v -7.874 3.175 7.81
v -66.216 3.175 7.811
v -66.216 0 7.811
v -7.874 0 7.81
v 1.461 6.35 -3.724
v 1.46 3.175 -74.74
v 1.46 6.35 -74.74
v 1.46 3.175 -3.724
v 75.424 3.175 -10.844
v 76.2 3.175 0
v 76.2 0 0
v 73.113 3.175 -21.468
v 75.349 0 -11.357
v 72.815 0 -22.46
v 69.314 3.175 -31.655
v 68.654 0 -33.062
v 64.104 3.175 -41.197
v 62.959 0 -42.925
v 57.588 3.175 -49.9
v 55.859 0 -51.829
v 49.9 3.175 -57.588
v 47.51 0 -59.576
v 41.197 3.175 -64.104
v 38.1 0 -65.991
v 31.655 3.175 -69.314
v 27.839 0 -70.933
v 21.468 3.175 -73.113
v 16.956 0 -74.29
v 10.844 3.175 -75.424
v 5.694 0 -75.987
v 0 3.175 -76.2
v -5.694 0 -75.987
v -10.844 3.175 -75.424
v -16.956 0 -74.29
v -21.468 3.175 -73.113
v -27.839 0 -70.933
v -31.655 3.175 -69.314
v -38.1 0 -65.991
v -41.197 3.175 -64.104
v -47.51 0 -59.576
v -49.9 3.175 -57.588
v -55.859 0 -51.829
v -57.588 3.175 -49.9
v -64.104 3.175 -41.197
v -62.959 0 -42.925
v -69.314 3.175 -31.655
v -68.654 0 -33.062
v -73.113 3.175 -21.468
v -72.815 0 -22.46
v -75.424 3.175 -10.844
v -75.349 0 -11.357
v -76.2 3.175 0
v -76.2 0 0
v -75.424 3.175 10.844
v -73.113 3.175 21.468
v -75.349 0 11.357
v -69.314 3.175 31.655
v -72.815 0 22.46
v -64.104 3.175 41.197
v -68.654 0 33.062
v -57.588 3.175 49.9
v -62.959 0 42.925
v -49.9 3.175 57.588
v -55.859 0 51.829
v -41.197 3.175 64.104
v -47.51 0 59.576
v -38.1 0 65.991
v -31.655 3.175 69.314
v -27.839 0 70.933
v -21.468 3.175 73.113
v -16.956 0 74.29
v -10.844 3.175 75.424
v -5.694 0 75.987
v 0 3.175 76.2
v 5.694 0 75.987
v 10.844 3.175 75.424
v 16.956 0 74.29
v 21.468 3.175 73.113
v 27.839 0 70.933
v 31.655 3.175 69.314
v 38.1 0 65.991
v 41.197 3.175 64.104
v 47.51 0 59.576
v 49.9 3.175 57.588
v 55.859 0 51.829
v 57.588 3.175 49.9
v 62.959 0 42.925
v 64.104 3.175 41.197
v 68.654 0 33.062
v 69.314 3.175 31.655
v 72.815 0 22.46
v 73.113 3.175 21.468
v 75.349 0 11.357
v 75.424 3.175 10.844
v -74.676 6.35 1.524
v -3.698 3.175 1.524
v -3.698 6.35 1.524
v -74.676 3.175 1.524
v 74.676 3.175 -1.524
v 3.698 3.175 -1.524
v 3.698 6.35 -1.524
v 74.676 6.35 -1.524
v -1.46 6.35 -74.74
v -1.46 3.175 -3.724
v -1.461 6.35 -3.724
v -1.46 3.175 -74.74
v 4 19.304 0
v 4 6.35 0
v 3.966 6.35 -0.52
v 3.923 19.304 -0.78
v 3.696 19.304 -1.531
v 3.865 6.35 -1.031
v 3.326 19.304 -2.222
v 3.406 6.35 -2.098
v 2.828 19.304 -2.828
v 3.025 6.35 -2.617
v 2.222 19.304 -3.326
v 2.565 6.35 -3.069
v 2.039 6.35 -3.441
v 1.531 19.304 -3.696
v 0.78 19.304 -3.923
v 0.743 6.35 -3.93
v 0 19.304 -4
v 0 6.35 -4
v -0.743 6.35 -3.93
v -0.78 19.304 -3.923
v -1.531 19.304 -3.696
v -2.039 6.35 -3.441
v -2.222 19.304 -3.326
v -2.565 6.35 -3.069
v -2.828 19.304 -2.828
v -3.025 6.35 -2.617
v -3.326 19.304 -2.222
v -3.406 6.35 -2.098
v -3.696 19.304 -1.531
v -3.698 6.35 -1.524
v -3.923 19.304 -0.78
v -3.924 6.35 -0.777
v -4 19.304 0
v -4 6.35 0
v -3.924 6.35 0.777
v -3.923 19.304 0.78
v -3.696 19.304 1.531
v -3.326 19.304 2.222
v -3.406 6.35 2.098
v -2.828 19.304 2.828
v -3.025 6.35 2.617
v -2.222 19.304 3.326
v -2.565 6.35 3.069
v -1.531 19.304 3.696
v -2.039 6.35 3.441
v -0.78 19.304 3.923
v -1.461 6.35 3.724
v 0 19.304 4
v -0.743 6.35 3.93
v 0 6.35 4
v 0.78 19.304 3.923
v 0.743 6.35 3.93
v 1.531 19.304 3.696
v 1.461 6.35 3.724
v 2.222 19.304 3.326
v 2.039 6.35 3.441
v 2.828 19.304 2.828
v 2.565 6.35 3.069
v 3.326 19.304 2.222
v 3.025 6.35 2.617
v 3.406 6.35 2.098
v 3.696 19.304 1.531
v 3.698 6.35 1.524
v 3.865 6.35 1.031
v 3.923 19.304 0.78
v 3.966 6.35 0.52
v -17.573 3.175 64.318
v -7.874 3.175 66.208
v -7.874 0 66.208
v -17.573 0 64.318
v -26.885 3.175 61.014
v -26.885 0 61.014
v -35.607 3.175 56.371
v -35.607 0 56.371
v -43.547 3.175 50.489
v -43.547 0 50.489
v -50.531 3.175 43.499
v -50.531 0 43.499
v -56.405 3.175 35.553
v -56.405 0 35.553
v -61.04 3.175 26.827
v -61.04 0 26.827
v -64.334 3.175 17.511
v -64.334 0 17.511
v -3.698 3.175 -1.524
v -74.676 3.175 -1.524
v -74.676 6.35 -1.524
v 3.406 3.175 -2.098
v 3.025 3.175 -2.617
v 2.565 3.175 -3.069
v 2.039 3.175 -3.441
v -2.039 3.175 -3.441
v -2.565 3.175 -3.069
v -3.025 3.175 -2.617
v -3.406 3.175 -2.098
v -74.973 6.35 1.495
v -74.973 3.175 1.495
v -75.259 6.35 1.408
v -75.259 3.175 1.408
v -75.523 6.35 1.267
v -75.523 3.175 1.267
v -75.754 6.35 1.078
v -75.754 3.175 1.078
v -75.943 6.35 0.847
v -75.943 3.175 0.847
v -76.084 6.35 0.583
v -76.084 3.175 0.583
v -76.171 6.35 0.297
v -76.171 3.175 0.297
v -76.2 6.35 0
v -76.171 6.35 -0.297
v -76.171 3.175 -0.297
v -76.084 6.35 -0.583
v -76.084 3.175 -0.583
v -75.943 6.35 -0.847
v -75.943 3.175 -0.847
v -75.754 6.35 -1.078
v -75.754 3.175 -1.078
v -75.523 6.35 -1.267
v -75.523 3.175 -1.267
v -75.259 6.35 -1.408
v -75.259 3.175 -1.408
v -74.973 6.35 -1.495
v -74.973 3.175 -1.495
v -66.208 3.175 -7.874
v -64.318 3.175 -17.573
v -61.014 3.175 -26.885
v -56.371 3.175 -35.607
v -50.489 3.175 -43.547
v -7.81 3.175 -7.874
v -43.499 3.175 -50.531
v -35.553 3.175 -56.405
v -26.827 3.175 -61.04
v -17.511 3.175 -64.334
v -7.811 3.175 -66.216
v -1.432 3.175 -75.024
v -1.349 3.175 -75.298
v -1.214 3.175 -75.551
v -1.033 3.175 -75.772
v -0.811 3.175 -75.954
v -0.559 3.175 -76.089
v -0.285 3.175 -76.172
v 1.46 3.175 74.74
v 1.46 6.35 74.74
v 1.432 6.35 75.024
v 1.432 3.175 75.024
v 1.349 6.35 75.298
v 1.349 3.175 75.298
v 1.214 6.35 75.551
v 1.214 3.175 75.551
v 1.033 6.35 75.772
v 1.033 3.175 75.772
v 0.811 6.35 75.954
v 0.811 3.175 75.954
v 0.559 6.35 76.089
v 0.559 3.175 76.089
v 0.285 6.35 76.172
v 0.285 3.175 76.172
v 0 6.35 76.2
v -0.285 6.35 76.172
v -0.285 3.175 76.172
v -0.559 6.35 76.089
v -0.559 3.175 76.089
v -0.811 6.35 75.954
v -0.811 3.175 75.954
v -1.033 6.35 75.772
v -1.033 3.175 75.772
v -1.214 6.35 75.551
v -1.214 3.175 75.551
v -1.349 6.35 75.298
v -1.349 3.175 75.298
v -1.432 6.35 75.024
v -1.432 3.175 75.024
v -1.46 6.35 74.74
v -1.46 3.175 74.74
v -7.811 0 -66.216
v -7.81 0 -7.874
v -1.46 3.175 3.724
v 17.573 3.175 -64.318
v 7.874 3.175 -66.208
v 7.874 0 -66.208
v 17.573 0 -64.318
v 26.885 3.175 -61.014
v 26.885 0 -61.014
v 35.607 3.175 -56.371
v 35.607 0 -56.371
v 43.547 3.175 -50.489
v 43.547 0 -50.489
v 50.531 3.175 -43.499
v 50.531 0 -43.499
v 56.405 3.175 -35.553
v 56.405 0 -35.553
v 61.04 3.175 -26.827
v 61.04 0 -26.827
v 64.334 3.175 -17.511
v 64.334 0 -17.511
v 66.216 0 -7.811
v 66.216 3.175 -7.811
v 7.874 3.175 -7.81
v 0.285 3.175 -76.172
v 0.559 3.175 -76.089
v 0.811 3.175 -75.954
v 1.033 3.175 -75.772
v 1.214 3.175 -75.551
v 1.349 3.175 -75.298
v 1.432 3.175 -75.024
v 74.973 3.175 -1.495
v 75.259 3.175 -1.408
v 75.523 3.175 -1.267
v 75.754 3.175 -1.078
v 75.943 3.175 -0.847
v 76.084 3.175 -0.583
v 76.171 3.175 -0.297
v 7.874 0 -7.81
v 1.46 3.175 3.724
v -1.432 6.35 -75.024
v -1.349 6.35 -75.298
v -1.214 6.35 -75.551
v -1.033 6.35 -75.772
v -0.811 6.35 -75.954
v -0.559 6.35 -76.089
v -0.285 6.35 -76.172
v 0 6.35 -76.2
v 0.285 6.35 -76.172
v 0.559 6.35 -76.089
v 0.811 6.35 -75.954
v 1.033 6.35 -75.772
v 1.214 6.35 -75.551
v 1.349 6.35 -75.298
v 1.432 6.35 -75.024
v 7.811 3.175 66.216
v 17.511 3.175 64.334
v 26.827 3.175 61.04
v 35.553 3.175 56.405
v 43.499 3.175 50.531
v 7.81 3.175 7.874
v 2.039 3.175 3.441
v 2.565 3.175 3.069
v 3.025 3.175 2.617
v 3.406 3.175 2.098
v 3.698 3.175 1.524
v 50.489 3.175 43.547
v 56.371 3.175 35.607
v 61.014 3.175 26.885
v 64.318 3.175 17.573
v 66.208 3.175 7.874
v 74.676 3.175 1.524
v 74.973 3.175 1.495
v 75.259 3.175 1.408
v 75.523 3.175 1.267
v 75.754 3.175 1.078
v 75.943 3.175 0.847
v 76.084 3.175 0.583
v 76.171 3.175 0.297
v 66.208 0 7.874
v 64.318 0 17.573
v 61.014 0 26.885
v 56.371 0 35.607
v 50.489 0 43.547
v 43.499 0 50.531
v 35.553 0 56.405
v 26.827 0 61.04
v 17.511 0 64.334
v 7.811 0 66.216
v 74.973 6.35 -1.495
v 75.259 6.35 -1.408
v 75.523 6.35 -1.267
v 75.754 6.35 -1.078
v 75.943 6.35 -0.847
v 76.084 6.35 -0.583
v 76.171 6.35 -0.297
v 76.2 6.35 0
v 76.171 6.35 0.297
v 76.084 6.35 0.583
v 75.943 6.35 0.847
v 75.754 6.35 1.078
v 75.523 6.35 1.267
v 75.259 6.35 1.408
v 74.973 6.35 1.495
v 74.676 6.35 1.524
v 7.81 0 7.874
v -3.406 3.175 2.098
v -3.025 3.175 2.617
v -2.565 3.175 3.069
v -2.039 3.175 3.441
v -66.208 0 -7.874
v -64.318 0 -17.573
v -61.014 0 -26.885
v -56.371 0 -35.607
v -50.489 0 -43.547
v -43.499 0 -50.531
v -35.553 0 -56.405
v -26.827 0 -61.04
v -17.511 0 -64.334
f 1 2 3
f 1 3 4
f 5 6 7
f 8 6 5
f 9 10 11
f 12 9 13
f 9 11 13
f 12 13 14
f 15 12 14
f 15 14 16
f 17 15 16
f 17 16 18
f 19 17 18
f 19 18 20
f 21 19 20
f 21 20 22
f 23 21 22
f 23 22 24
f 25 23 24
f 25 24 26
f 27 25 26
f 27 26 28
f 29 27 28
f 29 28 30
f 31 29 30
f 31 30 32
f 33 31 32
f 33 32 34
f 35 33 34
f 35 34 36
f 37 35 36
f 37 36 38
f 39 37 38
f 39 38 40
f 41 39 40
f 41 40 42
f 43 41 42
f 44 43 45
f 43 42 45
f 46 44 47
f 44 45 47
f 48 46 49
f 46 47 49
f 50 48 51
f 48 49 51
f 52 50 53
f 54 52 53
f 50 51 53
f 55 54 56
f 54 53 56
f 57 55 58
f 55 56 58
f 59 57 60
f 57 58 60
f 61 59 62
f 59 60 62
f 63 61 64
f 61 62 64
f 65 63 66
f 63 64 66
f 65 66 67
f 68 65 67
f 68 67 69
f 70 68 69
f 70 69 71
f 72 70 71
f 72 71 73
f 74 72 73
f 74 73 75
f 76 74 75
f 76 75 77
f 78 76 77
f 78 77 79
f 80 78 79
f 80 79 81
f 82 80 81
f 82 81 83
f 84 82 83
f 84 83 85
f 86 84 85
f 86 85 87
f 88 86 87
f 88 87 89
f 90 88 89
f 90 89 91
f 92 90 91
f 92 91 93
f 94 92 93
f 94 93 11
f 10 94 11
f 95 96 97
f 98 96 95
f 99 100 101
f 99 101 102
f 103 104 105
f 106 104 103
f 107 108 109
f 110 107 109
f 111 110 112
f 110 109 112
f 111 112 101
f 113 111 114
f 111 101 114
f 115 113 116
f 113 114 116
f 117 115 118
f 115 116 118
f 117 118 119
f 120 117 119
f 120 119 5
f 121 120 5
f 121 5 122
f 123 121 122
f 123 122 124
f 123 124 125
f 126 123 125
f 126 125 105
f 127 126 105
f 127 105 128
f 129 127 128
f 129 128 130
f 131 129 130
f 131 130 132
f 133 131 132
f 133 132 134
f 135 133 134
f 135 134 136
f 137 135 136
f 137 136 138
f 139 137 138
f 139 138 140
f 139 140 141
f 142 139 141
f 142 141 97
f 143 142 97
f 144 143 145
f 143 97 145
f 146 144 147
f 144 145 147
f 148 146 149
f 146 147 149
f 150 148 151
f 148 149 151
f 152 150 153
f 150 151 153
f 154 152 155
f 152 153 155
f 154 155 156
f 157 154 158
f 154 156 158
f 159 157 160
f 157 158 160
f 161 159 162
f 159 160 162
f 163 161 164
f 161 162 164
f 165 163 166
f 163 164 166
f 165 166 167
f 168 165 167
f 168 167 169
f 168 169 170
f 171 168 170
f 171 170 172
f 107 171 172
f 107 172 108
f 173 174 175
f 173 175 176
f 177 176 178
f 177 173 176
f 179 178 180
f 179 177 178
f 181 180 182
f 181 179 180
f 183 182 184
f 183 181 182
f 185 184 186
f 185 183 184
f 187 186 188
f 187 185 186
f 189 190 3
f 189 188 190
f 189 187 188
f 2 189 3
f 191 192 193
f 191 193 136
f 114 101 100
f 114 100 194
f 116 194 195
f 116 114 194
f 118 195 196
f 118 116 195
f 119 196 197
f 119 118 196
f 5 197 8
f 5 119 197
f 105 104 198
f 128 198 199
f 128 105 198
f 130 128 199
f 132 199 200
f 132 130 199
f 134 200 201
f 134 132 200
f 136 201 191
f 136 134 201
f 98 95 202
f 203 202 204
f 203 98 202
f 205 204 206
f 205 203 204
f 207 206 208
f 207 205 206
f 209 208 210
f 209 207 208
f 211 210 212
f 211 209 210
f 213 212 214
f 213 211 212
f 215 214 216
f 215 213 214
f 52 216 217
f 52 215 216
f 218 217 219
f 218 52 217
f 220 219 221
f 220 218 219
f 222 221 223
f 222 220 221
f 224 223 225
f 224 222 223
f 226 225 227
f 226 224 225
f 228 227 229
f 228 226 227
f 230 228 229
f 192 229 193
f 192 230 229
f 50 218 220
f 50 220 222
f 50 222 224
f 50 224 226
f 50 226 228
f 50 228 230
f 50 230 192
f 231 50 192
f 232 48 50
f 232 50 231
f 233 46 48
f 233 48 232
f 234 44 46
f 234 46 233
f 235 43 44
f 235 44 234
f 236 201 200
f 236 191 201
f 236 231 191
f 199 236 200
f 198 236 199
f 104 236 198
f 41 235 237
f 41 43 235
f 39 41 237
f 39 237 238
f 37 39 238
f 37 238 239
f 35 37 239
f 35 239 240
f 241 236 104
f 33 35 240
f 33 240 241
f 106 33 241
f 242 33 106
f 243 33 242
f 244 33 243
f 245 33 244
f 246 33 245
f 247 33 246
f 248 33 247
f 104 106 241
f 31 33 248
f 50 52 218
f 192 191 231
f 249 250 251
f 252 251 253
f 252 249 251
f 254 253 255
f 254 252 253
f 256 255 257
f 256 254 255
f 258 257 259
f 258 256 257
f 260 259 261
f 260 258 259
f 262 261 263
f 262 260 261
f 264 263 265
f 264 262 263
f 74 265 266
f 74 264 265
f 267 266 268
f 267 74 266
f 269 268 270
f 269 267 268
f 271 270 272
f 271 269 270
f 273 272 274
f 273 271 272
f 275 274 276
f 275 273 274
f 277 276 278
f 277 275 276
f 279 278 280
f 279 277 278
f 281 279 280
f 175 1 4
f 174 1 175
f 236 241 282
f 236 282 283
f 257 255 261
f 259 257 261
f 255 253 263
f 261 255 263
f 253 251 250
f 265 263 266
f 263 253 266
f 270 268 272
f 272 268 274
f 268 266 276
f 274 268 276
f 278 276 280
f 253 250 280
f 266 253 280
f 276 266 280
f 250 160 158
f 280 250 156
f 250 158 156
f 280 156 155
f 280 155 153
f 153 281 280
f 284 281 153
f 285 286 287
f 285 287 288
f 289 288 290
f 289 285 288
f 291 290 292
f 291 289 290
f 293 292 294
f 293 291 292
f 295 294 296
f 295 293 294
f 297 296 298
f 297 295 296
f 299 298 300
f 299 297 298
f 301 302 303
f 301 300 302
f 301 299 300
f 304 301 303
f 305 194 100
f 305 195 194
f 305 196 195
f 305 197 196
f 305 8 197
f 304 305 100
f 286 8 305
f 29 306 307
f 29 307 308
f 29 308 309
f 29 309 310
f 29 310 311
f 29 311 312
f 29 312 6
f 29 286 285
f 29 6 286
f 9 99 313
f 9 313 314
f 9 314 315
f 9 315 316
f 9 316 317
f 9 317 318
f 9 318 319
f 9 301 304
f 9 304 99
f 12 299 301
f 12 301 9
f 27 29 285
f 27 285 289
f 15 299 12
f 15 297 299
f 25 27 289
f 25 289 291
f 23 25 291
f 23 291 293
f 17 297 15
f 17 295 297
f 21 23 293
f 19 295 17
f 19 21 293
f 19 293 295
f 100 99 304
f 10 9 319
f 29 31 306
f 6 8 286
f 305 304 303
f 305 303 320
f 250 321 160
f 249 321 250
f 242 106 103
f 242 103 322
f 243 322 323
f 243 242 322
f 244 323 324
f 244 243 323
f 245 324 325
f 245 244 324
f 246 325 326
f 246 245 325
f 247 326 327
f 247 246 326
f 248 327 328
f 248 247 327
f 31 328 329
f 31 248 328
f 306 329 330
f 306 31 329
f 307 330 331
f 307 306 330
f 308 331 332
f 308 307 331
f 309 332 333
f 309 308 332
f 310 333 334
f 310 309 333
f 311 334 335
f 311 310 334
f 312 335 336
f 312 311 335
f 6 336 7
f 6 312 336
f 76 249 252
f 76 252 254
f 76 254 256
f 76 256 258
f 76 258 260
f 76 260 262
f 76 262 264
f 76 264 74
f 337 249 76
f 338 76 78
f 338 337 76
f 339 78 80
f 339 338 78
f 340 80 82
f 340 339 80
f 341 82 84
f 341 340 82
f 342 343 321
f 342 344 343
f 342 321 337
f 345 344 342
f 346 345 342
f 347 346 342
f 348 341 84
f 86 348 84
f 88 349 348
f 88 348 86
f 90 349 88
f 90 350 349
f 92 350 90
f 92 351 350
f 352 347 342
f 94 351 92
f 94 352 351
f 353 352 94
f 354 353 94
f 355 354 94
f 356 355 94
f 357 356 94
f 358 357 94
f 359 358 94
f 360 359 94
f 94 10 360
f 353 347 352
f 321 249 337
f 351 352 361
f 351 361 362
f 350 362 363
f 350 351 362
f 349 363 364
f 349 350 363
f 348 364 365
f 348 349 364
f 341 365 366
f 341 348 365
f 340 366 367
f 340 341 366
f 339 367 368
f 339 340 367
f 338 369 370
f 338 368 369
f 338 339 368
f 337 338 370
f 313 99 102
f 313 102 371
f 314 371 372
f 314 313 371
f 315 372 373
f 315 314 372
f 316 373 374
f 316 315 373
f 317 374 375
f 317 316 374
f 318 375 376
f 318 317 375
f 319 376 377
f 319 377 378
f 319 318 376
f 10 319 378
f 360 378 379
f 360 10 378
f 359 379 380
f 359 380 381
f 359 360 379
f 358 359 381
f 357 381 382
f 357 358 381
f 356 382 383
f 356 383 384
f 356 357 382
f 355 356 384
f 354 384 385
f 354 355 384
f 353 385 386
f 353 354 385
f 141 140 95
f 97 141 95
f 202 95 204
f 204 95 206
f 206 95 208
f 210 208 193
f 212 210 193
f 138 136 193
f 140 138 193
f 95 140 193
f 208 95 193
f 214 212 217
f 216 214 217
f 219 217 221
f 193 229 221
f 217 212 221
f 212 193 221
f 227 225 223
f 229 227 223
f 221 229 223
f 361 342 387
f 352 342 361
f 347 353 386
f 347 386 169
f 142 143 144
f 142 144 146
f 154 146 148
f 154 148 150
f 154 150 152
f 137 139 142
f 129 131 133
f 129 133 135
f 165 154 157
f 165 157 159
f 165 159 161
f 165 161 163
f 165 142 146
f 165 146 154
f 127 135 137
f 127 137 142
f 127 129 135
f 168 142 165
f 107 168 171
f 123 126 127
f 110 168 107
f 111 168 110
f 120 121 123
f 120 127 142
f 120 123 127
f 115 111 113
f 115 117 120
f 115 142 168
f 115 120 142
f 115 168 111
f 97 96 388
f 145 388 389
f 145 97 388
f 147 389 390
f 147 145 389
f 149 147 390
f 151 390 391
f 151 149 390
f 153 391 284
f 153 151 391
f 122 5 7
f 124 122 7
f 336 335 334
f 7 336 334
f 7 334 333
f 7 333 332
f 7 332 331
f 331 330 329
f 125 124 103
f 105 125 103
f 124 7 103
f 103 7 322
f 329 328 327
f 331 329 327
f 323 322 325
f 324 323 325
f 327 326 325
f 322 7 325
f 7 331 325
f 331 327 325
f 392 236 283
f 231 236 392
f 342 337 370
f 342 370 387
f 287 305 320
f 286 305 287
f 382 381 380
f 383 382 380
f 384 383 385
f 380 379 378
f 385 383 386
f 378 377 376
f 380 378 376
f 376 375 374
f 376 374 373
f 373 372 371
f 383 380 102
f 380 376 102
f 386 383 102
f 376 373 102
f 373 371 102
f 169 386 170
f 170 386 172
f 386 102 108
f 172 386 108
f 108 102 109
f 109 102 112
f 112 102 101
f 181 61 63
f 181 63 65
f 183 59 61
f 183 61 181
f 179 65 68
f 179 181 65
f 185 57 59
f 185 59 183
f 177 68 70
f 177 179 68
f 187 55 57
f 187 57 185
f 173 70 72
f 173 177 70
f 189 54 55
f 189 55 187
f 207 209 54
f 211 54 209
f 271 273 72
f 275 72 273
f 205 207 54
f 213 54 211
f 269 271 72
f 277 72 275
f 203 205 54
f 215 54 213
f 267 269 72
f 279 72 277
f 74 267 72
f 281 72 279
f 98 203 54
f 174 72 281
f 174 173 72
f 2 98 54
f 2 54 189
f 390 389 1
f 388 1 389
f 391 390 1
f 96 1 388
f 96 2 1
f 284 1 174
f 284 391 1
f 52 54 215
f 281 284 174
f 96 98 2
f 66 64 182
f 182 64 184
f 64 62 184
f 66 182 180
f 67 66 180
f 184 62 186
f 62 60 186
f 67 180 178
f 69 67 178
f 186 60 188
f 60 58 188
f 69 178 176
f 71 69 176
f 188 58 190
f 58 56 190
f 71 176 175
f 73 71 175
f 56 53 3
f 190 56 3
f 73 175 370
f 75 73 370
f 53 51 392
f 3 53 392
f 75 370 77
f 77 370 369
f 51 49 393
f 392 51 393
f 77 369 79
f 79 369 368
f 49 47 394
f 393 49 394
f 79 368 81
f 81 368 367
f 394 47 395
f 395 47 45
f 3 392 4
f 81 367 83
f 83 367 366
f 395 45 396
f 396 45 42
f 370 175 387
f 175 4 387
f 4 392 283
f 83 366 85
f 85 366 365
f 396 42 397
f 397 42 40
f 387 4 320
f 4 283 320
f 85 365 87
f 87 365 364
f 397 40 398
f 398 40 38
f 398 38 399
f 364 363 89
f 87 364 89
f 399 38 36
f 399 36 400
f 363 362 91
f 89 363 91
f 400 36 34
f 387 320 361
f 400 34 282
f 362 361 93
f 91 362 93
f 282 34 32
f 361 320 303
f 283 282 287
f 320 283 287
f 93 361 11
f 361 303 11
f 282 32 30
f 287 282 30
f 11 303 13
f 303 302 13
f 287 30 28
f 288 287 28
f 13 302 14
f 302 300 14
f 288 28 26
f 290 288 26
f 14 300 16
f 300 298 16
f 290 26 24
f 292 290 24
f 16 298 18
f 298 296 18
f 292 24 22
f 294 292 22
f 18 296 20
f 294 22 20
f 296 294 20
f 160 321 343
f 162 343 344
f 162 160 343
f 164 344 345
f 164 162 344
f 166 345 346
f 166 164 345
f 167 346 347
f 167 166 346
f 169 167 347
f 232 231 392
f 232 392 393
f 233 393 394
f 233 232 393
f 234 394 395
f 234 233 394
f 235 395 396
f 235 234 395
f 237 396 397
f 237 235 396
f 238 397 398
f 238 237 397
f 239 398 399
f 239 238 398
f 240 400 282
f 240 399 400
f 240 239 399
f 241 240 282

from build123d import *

# Parameters (mm, degrees)
SKETCH1_R                = 76.2
BOSS_EXTRUDE1_DEPTH      = 3.175
BOSS_EXTRUDE2_DEPTH      = 3.175
SKETCH3_R                = 4
BOSS_EXTRUDE3_DEPTH      = 12.954
BOSS_EXTRUDE3_DEPTH_BACK = 6.35
CUT_EXTRUDE1_DEPTH       = 4.175


with BuildPart() as part:
    # Sketch1 → Boss-Extrude1 (new body)
    with BuildSketch(Plane(origin=(0, 0, 0), x_dir=(1, 0, 0), z_dir=(0, 1, 0))):
        Circle(SKETCH1_R)
    extrude(amount=BOSS_EXTRUDE1_DEPTH)

    # Sketch2 → Boss-Extrude2 (add)
    with BuildSketch(Plane(origin=(0, 3.175, 0), x_dir=(1, 0, 0), z_dir=(0, 1, 0))):
        with BuildLine():
            Line((-74.676, 1.524), (74.676, 1.524))
            ThreePointArc((74.676, 1.524), (76.2, 0), (74.676, -1.524))
            Line((74.676, -1.524), (-74.676, -1.524))
            ThreePointArc((-74.676, -1.524), (-76.2, 0), (-74.676, 1.524))
        make_face()
        with BuildLine():
            Line((1.4605, 74.7395), (1.4605, -74.7395))
            ThreePointArc((1.4605, -74.7395), (0, -76.2), (-1.4605, -74.7395))
            Line((-1.4605, -74.7395), (-1.4605, 74.7395))
            ThreePointArc((-1.4605, 74.7395), (0, 76.2), (1.4605, 74.7395))
        make_face()
    extrude(amount=BOSS_EXTRUDE2_DEPTH)

    # Sketch3 → Boss-Extrude3 (add, two sides)
    with BuildSketch(Plane(origin=(0, 6.35, 0), x_dir=(1, 0, 0), z_dir=(0, 1, 0))) as boss_extrude3_sk:
        Circle(SKETCH3_R)
    extrude(amount=BOSS_EXTRUDE3_DEPTH)
    extrude(boss_extrude3_sk.sketch, amount=-BOSS_EXTRUDE3_DEPTH_BACK)

    # Sketch4 → Cut-Extrude1 (cut, through all)
    with BuildSketch(Plane(origin=(0, 3.175, 0), x_dir=(1, 0, 0), z_dir=(0, 1, 0))):
        with BuildLine():
            Line((-7.8105, 7.874), (-39.5605, 7.874))
            Line((-39.5605, 7.874), (-63.009920838, 7.874))
            Line((-63.009920838, 7.874), (-66.208426571, 7.874))
            ThreePointArc((-66.208426571, 7.874), (-47.123731651, 47.168946779), (-7.8105, 66.215947586))
            Line((-7.8105, 66.215947586), (-7.8105, 63.017823588))
            Line((-7.8105, 63.017823588), (-7.8105, 7.874))
        make_face()
        with BuildLine():
            Line((7.874, 63.009920838), (7.874, 66.208426571))
            ThreePointArc((7.874, 66.208426571), (47.168946779, 47.123731651), (66.215947586, 7.8105))
            Line((66.215947586, 7.8105), (63.017823588, 7.8105))
            Line((63.017823588, 7.8105), (7.874, 7.8105))
            Line((7.874, 7.8105), (7.874, 39.5605))
            Line((7.874, 39.5605), (7.874, 63.009920838))
        make_face()
        with BuildLine():
            Line((63.009920838, -7.874), (66.208426571, -7.874))
            ThreePointArc((66.208426571, -7.874), (47.123731651, -47.168946779), (7.8105, -66.215947586))
            Line((7.8105, -66.215947586), (7.8105, -63.017823588))
            Line((7.8105, -63.017823588), (7.8105, -7.874))
            Line((7.8105, -7.874), (39.5605, -7.874))
            Line((39.5605, -7.874), (63.009920838, -7.874))
        make_face()
        with BuildLine():
            Line((-7.874, -63.009920838), (-7.874, -66.208426571))
            ThreePointArc((-7.874, -66.208426571), (-47.168946779, -47.123731651), (-66.215947586, -7.8105))
            Line((-66.215947586, -7.8105), (-63.017823588, -7.8105))
            Line((-63.017823588, -7.8105), (-7.874, -7.8105))
            Line((-7.874, -7.8105), (-7.874, -39.5605))
            Line((-7.874, -39.5605), (-7.874, -63.009920838))
        make_face()
    extrude(amount=-CUT_EXTRUDE1_DEPTH, mode=Mode.SUBTRACT)


solid = part.part
